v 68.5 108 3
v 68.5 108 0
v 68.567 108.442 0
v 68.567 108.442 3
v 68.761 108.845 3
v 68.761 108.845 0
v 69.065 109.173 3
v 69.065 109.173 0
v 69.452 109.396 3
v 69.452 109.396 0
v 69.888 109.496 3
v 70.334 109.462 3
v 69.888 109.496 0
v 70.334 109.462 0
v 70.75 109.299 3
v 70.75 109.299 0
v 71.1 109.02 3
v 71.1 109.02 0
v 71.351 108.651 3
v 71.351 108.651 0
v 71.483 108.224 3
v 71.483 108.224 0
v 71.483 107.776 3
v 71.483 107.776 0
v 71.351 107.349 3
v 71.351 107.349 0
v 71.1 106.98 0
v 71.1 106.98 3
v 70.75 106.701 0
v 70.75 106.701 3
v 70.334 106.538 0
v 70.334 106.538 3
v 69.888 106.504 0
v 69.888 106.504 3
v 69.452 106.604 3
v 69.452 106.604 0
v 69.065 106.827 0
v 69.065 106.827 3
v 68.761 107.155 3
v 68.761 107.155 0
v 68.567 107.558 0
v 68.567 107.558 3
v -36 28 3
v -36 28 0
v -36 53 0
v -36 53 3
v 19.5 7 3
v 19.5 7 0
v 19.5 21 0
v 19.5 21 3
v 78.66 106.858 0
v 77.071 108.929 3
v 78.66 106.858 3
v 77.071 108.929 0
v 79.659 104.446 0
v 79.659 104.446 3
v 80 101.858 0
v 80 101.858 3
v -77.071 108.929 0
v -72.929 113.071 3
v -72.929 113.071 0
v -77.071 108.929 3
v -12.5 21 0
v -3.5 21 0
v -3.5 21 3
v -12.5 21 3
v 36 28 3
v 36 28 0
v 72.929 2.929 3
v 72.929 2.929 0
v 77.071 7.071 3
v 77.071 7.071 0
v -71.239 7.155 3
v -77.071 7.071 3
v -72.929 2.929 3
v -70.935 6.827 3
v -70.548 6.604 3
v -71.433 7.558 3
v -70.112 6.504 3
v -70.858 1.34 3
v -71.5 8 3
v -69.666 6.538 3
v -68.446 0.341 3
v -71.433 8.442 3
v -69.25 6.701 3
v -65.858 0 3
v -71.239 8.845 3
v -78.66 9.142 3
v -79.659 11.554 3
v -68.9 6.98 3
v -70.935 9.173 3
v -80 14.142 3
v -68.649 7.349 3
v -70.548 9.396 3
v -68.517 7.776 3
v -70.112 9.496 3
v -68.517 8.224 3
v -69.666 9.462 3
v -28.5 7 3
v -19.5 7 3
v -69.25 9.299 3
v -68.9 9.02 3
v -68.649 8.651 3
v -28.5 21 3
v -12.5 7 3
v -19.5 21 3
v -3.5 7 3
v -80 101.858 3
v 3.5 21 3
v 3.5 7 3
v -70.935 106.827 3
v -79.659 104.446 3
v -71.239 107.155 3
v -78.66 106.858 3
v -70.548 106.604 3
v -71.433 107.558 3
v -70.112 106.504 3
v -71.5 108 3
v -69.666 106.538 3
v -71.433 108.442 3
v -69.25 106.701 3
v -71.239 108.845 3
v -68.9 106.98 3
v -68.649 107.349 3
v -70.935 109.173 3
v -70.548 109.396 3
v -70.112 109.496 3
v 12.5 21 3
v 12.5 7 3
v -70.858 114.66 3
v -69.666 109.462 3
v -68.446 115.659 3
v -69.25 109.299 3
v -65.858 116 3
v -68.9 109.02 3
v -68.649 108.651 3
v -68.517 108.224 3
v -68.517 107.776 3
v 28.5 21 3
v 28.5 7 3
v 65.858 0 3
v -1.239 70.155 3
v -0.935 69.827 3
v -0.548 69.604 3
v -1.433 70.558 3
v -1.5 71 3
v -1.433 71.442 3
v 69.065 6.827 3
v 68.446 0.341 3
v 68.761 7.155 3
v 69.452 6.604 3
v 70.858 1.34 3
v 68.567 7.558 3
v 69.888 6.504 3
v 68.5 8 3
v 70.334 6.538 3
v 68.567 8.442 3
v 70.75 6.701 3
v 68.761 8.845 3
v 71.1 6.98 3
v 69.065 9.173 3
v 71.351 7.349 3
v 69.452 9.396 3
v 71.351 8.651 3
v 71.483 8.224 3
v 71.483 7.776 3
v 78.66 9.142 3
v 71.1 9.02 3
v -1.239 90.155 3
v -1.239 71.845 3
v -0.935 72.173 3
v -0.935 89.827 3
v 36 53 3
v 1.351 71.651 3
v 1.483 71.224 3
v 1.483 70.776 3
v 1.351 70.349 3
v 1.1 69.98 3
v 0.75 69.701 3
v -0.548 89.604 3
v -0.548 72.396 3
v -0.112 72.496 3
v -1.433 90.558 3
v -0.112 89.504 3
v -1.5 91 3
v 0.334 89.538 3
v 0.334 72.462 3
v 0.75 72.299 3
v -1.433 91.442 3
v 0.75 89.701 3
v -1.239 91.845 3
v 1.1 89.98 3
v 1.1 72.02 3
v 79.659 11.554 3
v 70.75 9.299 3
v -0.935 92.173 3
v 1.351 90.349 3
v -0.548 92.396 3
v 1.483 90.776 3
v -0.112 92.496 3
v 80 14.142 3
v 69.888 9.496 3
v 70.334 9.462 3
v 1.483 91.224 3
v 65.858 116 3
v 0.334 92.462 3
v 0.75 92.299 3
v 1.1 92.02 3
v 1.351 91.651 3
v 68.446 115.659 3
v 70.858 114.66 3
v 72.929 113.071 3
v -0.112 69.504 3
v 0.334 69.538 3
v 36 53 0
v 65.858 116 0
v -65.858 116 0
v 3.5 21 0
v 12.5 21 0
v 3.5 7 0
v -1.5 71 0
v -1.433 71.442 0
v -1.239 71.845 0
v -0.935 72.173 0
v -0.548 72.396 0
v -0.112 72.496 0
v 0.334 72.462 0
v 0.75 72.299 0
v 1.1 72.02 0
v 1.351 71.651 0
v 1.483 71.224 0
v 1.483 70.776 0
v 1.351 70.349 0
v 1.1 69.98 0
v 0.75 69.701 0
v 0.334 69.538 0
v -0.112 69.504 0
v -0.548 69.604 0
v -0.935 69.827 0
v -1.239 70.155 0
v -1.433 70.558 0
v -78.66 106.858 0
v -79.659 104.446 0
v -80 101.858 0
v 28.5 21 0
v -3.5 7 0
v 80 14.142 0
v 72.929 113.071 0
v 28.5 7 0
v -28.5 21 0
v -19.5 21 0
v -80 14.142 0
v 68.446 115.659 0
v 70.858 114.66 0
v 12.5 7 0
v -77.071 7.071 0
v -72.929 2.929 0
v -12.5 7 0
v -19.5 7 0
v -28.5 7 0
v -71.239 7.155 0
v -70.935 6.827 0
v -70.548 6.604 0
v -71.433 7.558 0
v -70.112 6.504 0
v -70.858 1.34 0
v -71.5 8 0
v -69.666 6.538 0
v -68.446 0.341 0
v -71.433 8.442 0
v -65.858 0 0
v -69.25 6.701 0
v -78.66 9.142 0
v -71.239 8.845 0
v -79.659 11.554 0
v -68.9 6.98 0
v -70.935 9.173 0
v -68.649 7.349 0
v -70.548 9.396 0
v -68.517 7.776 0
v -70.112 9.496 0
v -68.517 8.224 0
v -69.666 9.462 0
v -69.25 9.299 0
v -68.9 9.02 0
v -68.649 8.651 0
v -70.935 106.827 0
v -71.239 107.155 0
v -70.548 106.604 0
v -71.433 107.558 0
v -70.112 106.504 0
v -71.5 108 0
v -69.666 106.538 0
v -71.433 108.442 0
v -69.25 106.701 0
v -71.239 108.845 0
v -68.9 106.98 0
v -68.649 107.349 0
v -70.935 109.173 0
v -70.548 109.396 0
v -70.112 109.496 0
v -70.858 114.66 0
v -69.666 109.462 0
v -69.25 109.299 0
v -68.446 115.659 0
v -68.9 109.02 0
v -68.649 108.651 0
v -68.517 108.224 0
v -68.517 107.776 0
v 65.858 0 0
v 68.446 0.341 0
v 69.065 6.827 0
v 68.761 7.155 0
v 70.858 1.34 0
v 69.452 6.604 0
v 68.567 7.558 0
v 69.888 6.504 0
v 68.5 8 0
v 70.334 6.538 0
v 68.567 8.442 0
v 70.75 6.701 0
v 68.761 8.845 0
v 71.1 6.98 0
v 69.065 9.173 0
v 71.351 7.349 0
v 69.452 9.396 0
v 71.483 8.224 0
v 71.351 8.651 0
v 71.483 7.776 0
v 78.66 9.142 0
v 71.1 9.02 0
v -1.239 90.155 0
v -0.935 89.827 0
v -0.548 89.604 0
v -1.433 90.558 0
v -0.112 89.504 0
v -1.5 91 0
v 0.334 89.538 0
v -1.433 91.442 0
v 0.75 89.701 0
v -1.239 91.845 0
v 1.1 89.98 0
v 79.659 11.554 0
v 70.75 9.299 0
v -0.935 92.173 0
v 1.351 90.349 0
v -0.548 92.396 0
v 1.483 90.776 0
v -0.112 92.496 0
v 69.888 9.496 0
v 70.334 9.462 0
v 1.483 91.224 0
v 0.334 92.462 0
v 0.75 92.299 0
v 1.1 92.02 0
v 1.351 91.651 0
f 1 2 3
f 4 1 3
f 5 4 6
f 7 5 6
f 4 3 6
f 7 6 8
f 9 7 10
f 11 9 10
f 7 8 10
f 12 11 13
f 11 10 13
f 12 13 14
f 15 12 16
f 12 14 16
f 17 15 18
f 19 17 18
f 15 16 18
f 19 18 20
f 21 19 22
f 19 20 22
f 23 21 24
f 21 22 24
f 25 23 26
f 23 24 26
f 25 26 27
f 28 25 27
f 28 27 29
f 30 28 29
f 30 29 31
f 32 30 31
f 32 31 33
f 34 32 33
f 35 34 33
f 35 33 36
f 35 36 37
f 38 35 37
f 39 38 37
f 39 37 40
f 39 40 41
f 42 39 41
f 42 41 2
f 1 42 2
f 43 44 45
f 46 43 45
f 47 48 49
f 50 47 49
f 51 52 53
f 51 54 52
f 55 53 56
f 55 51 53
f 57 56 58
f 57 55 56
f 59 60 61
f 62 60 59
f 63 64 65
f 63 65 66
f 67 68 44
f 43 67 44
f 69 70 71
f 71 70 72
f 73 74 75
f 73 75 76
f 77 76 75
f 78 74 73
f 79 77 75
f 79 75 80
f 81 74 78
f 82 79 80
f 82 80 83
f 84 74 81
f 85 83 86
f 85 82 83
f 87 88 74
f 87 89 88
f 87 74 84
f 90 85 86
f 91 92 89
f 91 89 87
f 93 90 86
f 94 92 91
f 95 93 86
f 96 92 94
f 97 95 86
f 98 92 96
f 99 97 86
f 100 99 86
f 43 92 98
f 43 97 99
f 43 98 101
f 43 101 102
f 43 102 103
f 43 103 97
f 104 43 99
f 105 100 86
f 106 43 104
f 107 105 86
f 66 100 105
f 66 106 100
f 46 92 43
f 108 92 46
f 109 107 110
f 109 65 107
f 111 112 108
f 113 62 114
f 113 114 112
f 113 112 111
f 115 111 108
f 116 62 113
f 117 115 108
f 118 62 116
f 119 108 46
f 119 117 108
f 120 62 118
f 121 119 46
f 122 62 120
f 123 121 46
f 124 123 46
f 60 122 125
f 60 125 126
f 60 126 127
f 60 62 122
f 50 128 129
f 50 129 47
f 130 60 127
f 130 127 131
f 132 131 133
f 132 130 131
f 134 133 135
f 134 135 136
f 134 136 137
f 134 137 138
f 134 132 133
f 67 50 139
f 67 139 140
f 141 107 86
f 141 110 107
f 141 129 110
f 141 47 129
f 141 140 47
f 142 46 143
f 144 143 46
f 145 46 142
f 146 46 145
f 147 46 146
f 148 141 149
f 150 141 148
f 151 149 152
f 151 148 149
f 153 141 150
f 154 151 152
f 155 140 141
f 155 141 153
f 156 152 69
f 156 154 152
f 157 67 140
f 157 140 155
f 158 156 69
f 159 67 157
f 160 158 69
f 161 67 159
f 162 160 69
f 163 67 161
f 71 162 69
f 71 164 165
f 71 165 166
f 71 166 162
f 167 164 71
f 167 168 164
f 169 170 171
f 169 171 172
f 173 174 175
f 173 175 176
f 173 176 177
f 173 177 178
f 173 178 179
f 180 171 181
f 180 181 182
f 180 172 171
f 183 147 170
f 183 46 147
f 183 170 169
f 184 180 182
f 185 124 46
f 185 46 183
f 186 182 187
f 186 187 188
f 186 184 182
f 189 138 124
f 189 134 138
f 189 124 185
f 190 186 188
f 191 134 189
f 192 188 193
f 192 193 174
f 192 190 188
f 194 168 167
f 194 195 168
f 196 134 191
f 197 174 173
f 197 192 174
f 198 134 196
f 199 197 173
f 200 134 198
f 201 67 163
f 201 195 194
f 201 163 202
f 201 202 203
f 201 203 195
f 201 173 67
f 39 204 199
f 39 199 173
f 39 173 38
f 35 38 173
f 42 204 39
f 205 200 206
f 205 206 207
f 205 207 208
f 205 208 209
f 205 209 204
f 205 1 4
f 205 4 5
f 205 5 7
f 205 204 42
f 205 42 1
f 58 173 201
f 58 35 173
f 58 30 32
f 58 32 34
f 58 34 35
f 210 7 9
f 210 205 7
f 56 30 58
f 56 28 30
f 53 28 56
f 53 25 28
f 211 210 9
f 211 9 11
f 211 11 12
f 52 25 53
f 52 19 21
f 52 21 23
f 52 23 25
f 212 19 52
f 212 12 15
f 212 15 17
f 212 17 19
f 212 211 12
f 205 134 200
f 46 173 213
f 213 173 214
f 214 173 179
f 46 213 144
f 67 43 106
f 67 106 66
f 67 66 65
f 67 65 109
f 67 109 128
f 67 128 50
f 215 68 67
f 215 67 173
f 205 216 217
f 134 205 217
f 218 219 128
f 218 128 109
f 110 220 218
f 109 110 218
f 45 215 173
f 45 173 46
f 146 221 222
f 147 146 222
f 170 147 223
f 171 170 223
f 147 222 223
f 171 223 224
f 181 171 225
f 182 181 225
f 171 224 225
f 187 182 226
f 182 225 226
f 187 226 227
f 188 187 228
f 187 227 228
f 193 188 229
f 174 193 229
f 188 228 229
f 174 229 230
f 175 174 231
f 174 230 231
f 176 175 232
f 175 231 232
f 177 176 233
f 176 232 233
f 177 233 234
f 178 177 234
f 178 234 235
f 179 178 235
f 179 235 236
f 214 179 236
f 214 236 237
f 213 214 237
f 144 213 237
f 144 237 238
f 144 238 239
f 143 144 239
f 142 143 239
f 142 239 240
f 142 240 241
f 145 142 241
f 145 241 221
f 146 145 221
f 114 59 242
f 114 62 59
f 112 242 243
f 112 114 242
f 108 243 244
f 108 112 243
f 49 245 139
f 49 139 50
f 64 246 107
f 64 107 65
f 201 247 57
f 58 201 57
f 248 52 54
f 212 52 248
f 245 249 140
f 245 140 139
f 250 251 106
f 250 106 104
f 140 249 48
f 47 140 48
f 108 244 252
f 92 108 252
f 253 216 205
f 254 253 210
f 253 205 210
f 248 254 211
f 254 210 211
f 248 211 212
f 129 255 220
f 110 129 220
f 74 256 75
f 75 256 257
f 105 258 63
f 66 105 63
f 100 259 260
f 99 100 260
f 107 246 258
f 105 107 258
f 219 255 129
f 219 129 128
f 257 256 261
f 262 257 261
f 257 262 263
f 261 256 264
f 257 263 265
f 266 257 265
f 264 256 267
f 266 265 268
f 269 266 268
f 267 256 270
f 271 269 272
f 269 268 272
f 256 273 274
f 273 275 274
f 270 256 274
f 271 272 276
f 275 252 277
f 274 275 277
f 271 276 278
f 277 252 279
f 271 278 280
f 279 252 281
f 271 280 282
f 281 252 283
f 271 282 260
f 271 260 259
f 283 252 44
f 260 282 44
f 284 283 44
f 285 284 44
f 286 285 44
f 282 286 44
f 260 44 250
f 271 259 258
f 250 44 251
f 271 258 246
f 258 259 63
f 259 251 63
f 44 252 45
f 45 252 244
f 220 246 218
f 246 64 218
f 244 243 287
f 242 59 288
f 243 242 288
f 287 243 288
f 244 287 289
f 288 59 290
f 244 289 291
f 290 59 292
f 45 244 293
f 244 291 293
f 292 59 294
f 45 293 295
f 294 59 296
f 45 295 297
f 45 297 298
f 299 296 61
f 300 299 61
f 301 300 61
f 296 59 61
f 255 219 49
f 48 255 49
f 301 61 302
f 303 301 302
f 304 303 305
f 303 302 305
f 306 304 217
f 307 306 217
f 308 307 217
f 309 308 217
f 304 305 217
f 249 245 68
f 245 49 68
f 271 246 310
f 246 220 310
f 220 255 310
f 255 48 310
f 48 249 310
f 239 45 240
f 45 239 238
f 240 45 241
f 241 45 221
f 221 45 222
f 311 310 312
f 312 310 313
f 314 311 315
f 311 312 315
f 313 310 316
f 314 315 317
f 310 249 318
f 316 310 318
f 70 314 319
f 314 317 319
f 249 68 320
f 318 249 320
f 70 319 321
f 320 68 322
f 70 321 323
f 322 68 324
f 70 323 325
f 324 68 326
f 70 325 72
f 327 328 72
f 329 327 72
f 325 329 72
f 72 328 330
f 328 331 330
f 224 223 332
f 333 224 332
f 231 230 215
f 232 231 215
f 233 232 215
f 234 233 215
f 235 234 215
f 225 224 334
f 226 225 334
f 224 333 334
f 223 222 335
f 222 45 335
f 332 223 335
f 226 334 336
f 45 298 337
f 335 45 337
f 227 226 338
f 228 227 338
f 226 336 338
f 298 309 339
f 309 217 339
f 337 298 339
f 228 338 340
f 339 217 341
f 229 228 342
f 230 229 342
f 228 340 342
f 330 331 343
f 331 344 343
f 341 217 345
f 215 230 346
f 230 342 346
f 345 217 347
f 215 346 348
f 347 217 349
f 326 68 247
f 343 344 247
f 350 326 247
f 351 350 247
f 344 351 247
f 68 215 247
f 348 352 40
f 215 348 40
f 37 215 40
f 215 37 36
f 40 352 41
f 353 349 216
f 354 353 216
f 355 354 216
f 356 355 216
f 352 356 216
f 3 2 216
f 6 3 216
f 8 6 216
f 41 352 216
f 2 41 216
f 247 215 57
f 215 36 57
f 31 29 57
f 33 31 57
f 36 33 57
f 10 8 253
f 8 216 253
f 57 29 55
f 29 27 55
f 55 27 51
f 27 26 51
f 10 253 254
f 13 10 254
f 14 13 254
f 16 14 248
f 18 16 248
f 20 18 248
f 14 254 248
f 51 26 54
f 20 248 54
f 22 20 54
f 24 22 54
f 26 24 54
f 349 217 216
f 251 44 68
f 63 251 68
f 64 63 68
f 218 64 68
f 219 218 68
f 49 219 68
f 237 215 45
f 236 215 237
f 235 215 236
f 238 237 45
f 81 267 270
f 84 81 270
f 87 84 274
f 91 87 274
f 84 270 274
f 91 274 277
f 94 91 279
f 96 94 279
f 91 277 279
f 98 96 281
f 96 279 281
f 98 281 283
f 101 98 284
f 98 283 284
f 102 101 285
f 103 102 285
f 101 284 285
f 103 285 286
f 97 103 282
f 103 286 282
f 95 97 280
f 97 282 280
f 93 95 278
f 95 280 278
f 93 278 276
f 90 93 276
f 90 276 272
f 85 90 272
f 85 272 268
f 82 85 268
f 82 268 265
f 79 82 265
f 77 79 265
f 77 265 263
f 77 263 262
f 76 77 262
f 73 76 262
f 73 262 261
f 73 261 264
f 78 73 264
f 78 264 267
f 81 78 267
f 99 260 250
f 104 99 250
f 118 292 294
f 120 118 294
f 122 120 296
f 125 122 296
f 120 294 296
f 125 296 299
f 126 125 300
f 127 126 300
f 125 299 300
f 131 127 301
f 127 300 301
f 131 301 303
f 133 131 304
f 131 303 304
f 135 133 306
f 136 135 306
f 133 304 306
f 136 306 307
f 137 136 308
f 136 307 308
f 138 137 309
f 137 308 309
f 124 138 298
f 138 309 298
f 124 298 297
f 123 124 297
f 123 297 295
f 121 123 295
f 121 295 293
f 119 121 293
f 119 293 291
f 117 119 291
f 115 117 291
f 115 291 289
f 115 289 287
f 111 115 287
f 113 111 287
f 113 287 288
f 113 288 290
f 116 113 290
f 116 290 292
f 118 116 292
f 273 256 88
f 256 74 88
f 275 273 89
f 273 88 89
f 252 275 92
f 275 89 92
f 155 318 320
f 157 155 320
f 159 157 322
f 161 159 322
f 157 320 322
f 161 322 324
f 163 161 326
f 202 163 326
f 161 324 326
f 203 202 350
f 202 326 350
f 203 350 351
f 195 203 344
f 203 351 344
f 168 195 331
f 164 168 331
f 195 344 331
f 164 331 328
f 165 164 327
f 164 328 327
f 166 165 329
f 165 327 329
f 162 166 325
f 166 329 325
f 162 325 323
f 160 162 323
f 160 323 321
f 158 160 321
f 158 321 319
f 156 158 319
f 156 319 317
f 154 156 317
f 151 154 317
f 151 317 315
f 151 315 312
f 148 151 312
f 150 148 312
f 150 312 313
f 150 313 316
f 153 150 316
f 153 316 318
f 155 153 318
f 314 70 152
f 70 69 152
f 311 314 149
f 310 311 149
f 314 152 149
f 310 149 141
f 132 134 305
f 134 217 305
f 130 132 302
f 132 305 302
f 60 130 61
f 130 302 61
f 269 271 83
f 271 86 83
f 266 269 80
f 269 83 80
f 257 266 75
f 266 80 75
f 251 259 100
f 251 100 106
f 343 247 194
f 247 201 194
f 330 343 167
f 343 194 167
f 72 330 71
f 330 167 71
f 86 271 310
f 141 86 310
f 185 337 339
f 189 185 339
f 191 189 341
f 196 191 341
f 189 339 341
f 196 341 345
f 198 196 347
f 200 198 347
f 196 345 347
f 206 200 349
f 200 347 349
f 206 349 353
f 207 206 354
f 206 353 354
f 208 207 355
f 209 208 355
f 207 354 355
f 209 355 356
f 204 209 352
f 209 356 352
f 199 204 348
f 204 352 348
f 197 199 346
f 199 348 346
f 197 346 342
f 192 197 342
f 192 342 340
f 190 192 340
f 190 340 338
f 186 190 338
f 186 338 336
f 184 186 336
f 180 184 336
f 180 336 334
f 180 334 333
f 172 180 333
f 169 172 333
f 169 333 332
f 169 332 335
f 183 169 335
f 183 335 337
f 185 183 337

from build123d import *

# Parameters (mm, degrees)
BOSS_EXTRUDE1_DEPTH     = 3
CUT_EXTRUDE1_DEPTH      = 141.943250991
CUT_EXTRUDE1_DEPTH_BACK = 3
CUT_EXTRUDE2_DEPTH      = 141.943250991
CUT_EXTRUDE2_DEPTH_BACK = 3
SKETCH5_R               = 1.5
SKETCH5_W               = 72
SKETCH5_H               = 25
SKETCH5_W_2             = 9
SKETCH5_H_2             = 14
CUT_EXTRUDE3_DEPTH      = 141.943250991
FILLET1_R               = 10


with BuildPart() as part:
    # Sketch1 → Boss-Extrude1 (new body)
    with BuildSketch(Plane.XY):
        Polygon((80, 116), (-80, 116), (-80, 10), (-70, 0), (70, 0), (80, 10), align=None)
    extrude(amount=BOSS_EXTRUDE1_DEPTH)

    # Sketch3 → Cut-Extrude1 (cut, two sides: drawn at the far end of the back side and taken through both)
    with BuildSketch(Plane(origin=(0, 0, 0), x_dir=(-1, 0, 0), z_dir=(0, 0, -1)).offset(-CUT_EXTRUDE1_DEPTH_BACK)):
        Polygon((-358.49693246, -172.49693246), (-80, 106), (-70, 116), (208.49693246, 394.49693246), (-348.49693246, 951.49079738), (-915.49079738, 384.49693246), align=None)
    extrude(amount=CUT_EXTRUDE1_DEPTH + CUT_EXTRUDE1_DEPTH_BACK, mode=Mode.SUBTRACT)

    # Sketch4 → Cut-Extrude2 (cut, two sides: drawn at the far end of the back side and taken through both)
    with BuildSketch(Plane(origin=(0, 0, 0), x_dir=(-1, 0, 0), z_dir=(0, 0, -1)).offset(-CUT_EXTRUDE2_DEPTH_BACK)):
        Polygon((-208.49693246, 394.49693246), (70, 116), (80, 106), (358.49693246, -172.49693246), (915.49079738, 384.49693246), (348.49693246, 951.49079738), align=None)
    extrude(amount=CUT_EXTRUDE2_DEPTH + CUT_EXTRUDE2_DEPTH_BACK, mode=Mode.SUBTRACT)

    # Sketch5 → Cut-Extrude3 (cut, through all)
    with BuildSketch(Plane(origin=(0, 0, 0), x_dir=(-1, 0, 0), z_dir=(0, 0, -1))):
        with Locations((0, 91)):
            Circle(SKETCH5_R)
        with Locations((0, 71)):
            Circle(SKETCH5_R)
        with Locations((-70, 8)):
            Circle(SKETCH5_R)
        with Locations((70, 8)):
            Circle(SKETCH5_R)
        with Locations((70, 108)):
            Circle(SKETCH5_R)
        with Locations((-70, 108)):
            Circle(SKETCH5_R)
        with Locations((0, 40.5)):
            Rectangle(SKETCH5_W, SKETCH5_H)
        with Locations((-24, 14)):
            Rectangle(SKETCH5_W_2, SKETCH5_H_2)
        with Locations((-8, 14)):
            Rectangle(SKETCH5_W_2, SKETCH5_H_2)
        with Locations((8, 14)):
            Rectangle(SKETCH5_W_2, SKETCH5_H_2)
        with Locations((24, 14)):
            Rectangle(SKETCH5_W_2, SKETCH5_H_2)
    extrude(amount=-CUT_EXTRUDE3_DEPTH, mode=Mode.SUBTRACT)

    # Fillet1
    fillet1_edges = [part.edges().sort_by_distance(p)[0] for p in [
        (-80, 10, 1.5),
        (80, 10, 1.5),
        (70, 0, 1.5),
        (-70, 0, 1.5),
        (80, 106, 1.5),
        (70, 116, 1.5),
        (-70, 116, 1.5),
        (-80, 106, 1.5),
    ]]
    fillet(fillet1_edges, radius=FILLET1_R)


solid = part.part
